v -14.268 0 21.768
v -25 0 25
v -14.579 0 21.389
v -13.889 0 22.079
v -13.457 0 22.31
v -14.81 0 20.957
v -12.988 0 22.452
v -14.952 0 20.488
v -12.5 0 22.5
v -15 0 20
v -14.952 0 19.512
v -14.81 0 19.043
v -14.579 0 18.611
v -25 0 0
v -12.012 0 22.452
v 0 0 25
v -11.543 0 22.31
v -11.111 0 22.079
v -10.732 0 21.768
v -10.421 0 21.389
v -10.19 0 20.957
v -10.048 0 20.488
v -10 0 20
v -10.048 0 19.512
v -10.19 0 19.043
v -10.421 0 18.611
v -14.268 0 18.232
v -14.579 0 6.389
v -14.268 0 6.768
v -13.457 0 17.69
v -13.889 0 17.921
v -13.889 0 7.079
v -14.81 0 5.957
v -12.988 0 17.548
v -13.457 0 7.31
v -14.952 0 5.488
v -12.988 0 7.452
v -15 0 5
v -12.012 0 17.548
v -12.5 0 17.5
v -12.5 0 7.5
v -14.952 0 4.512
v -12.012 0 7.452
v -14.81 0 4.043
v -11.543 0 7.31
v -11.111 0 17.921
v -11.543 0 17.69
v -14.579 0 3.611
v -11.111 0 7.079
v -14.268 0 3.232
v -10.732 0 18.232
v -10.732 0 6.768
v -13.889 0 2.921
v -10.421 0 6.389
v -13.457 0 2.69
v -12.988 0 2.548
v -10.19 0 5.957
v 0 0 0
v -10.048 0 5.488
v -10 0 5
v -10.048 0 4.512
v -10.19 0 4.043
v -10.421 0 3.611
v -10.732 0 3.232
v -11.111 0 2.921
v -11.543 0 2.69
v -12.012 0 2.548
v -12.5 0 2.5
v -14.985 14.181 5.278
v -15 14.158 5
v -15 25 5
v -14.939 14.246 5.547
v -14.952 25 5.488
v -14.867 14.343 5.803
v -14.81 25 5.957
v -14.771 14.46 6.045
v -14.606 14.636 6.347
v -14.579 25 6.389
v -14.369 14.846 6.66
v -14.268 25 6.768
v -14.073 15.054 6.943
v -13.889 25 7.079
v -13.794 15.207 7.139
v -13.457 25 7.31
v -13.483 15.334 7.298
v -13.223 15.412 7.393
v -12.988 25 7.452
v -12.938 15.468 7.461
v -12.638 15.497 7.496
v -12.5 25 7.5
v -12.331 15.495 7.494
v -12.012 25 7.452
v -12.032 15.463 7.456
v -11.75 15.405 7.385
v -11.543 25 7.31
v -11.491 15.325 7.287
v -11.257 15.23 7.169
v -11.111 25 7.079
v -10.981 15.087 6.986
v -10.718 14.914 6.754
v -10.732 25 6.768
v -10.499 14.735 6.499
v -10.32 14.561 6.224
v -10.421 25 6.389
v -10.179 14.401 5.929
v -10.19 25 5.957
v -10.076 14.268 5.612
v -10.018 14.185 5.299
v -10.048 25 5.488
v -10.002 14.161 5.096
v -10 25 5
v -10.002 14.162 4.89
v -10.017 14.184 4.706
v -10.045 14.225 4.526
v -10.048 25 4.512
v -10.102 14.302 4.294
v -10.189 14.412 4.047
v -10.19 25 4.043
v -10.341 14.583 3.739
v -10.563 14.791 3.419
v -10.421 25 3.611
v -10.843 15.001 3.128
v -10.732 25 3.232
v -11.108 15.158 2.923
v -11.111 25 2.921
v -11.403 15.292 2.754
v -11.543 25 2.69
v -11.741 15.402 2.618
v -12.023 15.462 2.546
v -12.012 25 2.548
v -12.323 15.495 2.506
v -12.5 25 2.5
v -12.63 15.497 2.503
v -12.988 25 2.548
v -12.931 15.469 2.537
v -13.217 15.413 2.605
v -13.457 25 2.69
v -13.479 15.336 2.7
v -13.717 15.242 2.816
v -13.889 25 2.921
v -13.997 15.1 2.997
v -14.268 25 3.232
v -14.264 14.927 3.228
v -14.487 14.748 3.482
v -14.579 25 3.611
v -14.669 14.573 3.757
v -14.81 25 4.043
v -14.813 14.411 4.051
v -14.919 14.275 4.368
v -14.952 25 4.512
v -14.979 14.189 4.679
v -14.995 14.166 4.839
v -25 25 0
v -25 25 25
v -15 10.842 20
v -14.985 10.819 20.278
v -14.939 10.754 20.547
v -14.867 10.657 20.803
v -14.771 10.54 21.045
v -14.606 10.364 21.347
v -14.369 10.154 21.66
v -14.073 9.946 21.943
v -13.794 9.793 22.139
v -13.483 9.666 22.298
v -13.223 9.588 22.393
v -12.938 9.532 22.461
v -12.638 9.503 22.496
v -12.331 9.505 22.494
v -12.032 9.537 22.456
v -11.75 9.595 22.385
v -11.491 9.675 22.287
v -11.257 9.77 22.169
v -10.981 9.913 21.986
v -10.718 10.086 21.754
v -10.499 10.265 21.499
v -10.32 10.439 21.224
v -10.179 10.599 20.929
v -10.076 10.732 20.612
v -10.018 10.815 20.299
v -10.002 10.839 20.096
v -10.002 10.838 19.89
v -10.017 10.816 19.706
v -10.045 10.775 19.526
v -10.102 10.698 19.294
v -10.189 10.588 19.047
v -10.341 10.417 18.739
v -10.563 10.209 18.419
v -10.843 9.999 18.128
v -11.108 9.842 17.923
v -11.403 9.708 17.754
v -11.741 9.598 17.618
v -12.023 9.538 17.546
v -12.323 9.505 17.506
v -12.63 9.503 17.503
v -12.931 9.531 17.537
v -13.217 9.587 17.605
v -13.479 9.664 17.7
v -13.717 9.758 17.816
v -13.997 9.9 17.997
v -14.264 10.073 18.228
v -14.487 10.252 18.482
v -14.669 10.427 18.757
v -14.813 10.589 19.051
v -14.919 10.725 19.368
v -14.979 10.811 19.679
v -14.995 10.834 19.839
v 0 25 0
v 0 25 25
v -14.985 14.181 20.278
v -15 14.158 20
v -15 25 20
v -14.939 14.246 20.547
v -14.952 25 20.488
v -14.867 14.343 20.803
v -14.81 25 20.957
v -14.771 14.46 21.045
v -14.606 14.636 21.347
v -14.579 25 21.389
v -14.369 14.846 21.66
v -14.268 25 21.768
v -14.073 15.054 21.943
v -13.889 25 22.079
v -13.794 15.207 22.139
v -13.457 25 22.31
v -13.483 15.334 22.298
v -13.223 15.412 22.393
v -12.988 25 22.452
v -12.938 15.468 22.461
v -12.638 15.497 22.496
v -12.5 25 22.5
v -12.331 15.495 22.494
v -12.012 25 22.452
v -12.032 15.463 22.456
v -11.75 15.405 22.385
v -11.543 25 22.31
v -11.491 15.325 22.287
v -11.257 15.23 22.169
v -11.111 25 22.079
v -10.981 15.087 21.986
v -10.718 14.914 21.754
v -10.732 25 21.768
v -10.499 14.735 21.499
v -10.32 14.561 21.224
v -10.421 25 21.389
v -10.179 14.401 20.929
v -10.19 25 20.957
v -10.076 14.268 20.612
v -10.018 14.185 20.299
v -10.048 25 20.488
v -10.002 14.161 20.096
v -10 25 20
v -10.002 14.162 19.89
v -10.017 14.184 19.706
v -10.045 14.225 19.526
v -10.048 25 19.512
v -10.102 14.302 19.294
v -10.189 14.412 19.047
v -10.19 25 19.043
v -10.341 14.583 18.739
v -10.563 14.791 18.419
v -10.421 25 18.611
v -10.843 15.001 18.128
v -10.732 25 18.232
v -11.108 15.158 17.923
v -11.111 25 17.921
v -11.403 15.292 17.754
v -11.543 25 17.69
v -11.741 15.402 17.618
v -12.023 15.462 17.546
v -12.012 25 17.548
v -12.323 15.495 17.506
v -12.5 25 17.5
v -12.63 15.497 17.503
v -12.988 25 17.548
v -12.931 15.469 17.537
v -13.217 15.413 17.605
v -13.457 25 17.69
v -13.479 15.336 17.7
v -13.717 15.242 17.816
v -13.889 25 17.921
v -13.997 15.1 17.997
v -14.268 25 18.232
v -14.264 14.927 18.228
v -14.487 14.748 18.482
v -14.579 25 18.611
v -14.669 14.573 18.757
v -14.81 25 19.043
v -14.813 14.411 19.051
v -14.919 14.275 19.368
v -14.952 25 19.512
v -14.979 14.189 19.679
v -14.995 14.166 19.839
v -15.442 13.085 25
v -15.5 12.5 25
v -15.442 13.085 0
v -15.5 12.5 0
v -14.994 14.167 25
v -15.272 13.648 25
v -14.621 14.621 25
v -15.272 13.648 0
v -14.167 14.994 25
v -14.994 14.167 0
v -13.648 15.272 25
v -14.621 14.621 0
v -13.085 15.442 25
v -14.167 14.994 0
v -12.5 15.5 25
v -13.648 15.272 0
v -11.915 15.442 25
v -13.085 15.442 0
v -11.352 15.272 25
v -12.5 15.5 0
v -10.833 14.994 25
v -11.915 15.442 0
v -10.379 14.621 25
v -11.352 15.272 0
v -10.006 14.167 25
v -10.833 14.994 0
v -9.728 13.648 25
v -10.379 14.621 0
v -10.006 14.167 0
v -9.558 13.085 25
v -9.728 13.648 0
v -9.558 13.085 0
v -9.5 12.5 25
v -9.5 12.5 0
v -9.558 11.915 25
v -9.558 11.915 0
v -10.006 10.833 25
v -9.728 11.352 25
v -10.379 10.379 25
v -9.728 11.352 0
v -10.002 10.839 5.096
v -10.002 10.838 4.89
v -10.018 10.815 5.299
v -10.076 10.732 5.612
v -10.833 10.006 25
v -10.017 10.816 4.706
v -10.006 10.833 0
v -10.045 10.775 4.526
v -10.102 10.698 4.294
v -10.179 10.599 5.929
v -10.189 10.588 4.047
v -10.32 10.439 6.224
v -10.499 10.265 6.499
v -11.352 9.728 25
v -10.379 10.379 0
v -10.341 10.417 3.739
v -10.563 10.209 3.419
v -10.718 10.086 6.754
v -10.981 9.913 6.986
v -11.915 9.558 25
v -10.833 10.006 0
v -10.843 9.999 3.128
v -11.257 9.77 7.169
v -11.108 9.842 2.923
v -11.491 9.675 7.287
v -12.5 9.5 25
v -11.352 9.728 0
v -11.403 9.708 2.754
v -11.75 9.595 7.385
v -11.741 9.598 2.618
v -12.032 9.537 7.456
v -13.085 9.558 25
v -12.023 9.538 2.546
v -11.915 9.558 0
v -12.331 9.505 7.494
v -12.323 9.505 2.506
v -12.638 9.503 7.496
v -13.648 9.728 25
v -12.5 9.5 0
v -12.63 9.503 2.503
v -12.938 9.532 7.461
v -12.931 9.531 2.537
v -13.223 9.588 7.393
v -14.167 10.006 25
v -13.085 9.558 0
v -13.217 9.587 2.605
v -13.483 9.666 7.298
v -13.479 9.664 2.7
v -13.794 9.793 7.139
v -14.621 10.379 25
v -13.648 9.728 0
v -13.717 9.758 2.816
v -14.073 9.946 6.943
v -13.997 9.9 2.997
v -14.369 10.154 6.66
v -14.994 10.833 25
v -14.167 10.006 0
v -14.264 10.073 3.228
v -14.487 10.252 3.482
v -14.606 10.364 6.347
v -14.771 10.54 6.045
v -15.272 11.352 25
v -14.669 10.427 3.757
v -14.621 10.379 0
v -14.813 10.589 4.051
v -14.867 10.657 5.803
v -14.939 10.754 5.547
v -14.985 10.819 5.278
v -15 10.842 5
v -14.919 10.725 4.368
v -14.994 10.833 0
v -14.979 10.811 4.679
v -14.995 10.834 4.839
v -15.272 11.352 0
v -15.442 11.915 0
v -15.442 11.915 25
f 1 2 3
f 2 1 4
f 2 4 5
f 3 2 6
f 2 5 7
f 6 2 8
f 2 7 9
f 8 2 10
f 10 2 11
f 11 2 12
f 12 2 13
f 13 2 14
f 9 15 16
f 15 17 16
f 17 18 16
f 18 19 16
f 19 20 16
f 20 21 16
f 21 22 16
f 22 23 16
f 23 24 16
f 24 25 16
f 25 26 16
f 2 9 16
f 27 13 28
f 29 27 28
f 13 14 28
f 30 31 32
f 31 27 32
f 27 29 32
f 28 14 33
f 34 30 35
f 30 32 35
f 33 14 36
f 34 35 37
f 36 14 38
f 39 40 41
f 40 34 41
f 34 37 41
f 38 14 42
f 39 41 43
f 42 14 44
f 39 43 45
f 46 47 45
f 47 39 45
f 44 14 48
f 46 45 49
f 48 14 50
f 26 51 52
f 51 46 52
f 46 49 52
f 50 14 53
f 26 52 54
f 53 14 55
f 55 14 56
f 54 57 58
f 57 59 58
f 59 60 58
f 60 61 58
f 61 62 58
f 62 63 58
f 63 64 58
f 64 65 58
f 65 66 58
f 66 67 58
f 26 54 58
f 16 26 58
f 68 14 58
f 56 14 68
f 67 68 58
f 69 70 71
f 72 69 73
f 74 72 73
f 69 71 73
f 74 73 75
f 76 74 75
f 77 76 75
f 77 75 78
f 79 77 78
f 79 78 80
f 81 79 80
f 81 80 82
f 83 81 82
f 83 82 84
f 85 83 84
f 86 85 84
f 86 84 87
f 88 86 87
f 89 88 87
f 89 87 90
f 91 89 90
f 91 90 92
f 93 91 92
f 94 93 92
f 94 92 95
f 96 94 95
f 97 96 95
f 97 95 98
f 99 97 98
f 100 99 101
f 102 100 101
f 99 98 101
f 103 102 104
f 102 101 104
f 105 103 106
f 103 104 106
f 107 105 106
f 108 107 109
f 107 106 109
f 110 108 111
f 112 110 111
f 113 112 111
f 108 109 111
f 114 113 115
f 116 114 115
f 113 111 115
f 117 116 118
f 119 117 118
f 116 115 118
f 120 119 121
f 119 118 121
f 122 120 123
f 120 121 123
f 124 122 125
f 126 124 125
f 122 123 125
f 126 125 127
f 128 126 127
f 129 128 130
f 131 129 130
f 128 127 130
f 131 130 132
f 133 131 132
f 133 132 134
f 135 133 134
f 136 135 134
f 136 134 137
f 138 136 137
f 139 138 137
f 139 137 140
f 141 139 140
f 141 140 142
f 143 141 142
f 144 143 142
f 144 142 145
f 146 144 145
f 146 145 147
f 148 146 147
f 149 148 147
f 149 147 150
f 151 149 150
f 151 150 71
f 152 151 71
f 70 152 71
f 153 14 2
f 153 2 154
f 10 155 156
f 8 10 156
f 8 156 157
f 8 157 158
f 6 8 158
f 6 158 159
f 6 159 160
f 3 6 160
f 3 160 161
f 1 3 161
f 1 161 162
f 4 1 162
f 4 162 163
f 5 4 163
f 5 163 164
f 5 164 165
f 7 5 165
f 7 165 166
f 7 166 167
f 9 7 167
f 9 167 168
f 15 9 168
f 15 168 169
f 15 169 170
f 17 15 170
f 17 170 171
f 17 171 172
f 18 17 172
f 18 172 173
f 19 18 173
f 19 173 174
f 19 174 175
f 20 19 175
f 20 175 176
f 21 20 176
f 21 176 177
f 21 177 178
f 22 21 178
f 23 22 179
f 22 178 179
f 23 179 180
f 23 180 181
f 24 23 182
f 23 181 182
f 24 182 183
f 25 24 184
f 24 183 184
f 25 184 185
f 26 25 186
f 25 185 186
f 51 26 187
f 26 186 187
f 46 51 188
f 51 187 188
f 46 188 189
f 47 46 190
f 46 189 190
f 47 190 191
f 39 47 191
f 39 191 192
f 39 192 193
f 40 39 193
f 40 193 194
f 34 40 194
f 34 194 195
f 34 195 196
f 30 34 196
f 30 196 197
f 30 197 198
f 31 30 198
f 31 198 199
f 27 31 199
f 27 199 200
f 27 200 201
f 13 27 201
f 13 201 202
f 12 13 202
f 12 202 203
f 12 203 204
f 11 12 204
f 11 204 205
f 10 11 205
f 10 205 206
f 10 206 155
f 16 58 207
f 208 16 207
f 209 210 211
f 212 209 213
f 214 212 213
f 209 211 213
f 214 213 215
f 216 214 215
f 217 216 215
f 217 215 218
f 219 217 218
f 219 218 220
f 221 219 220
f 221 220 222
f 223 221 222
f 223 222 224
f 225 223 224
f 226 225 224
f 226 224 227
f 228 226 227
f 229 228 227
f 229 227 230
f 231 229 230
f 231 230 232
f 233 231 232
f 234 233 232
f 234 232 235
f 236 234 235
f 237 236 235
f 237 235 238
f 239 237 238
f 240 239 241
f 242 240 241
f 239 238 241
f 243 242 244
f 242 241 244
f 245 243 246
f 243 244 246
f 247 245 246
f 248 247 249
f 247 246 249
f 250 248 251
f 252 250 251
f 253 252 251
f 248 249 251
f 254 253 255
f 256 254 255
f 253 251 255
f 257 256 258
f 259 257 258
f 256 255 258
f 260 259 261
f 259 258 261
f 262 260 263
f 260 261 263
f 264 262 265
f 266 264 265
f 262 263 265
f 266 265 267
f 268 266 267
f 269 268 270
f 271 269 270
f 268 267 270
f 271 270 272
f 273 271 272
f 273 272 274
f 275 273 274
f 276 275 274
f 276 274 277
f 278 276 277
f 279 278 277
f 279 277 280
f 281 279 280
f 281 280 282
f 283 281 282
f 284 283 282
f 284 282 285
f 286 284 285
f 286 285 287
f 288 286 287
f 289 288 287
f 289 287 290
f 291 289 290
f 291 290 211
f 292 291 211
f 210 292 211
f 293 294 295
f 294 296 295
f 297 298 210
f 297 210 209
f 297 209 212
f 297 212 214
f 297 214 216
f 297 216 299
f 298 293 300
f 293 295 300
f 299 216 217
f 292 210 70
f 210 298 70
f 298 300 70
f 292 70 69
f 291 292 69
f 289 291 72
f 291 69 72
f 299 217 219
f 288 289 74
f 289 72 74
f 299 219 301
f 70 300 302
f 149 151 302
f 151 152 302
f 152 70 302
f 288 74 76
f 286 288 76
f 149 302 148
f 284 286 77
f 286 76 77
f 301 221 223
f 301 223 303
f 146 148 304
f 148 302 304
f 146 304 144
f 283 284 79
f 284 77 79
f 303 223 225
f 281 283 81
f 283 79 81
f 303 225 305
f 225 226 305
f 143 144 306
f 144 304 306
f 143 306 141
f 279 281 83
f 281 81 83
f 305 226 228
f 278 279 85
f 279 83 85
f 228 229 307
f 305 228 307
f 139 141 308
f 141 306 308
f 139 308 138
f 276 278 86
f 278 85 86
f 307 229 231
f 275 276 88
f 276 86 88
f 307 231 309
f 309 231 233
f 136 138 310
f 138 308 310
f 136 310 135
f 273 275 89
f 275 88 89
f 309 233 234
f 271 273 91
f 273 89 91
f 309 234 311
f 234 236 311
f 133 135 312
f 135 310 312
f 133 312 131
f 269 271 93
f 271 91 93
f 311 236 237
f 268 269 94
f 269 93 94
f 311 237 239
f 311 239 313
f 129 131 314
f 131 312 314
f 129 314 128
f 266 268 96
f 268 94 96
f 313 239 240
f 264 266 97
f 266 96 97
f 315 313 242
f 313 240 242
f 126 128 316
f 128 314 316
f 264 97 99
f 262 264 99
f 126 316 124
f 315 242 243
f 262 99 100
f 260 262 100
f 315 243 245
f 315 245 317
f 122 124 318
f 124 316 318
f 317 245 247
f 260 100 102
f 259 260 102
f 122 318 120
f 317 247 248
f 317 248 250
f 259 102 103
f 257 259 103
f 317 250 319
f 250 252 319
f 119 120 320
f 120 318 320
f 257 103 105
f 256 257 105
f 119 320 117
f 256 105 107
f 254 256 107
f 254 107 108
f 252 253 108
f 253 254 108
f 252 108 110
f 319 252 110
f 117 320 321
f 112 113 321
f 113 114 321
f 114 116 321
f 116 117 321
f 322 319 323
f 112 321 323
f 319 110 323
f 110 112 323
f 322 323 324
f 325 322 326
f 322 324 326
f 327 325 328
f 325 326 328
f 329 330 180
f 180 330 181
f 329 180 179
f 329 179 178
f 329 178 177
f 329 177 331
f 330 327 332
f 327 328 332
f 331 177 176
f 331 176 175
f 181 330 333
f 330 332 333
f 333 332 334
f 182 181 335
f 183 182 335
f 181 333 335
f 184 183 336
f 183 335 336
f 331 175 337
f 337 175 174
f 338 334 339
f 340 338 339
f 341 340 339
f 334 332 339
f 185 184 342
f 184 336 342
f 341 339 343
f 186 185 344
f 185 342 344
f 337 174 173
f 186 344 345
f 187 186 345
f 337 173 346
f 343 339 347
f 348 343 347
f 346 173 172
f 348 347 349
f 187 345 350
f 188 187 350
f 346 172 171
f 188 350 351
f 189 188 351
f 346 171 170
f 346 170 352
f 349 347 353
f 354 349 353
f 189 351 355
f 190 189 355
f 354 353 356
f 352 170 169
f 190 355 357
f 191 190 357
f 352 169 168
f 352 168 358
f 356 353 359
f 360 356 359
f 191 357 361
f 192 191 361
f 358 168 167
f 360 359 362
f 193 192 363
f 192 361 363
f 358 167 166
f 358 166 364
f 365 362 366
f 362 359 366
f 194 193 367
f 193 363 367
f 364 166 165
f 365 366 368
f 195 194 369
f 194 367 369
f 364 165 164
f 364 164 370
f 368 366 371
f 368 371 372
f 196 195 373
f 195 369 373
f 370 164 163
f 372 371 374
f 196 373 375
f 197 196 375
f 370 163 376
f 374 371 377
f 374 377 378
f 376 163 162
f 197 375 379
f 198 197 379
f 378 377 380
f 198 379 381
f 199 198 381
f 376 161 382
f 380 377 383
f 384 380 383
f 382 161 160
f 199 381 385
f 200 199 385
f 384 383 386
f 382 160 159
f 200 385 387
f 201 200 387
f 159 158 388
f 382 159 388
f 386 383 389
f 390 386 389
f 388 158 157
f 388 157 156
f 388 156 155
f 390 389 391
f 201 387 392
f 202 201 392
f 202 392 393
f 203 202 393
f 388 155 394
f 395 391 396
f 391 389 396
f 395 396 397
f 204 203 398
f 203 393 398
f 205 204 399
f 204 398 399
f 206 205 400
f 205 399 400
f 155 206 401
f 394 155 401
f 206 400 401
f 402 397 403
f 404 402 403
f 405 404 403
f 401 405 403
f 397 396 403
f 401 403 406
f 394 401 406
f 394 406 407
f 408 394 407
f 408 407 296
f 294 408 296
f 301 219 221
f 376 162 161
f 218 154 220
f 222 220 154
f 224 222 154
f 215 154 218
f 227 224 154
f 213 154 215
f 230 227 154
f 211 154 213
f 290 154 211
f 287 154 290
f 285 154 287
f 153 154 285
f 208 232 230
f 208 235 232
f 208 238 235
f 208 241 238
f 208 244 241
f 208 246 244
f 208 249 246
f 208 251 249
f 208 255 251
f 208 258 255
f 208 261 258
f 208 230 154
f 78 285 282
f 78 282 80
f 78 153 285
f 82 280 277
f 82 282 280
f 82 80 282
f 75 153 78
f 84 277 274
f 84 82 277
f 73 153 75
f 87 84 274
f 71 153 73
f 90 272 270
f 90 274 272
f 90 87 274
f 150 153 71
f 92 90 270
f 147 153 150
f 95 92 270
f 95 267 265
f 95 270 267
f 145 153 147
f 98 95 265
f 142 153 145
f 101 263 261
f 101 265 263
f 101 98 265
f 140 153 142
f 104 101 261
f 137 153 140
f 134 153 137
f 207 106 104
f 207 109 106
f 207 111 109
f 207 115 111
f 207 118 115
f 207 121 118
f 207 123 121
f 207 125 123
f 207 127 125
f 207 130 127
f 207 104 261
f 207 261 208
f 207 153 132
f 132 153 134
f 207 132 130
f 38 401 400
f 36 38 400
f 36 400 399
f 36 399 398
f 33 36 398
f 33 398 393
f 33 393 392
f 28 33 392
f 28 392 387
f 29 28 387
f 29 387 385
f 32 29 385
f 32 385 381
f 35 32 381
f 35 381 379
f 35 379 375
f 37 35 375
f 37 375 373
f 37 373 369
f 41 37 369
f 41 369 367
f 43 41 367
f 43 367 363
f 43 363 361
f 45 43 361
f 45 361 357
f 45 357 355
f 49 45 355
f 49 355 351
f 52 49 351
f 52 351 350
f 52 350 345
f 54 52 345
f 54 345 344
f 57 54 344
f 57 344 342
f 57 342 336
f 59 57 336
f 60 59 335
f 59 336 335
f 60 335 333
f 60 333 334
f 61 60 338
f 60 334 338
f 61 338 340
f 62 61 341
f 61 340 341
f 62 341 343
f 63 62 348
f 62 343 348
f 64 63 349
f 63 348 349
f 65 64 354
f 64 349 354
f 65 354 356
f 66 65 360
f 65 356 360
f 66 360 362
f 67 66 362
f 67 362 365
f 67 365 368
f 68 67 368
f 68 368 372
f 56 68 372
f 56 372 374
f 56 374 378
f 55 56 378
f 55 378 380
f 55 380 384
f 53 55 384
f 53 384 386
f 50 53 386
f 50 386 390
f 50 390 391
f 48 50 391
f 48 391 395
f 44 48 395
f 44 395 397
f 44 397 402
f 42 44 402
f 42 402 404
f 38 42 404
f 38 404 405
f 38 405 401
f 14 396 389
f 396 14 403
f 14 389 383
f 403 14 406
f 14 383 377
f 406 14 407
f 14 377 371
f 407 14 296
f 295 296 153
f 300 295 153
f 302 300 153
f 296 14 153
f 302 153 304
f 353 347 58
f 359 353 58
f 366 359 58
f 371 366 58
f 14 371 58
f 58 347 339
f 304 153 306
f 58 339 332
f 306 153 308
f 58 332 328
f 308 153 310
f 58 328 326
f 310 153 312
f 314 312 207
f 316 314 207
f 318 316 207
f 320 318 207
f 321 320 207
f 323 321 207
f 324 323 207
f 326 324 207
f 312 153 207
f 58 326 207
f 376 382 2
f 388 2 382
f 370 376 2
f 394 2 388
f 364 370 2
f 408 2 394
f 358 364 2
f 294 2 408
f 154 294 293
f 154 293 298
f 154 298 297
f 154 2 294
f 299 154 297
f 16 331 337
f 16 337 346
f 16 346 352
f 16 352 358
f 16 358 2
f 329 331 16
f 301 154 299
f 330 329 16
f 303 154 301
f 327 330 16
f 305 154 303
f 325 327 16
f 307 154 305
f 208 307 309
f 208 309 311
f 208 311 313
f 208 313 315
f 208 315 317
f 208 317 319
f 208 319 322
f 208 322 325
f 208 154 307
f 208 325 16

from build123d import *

# Parameters (mm, degrees)
F0_W     = 25
F0_H     = 25
F1_DEPTH = 25
F3_D     = 6
F5_D     = 5
F7_D     = 5


with BuildPart() as f1:
    # F0 (on Top) → F1 (new body)
    with BuildSketch(Plane.XY):
        with Locations((-12.5, 12.5)):
            Rectangle(F0_W, F0_H)
    extrude(amount=F1_DEPTH)

    # F3 (through all)
    with Locations(Plane.XY.offset(25)):
        with Locations((-12.5, 12.5)):
            Hole(F3_D / 2)

    # F5 (through all)
    with Locations(Plane.XZ):
        with Locations((-12.5, 20)):
            Hole(F5_D / 2)

    # F7 (through all)
    with Locations(Plane.XZ):
        with Locations((-12.5, 5)):
            Hole(F7_D / 2)


solid = f1.part
